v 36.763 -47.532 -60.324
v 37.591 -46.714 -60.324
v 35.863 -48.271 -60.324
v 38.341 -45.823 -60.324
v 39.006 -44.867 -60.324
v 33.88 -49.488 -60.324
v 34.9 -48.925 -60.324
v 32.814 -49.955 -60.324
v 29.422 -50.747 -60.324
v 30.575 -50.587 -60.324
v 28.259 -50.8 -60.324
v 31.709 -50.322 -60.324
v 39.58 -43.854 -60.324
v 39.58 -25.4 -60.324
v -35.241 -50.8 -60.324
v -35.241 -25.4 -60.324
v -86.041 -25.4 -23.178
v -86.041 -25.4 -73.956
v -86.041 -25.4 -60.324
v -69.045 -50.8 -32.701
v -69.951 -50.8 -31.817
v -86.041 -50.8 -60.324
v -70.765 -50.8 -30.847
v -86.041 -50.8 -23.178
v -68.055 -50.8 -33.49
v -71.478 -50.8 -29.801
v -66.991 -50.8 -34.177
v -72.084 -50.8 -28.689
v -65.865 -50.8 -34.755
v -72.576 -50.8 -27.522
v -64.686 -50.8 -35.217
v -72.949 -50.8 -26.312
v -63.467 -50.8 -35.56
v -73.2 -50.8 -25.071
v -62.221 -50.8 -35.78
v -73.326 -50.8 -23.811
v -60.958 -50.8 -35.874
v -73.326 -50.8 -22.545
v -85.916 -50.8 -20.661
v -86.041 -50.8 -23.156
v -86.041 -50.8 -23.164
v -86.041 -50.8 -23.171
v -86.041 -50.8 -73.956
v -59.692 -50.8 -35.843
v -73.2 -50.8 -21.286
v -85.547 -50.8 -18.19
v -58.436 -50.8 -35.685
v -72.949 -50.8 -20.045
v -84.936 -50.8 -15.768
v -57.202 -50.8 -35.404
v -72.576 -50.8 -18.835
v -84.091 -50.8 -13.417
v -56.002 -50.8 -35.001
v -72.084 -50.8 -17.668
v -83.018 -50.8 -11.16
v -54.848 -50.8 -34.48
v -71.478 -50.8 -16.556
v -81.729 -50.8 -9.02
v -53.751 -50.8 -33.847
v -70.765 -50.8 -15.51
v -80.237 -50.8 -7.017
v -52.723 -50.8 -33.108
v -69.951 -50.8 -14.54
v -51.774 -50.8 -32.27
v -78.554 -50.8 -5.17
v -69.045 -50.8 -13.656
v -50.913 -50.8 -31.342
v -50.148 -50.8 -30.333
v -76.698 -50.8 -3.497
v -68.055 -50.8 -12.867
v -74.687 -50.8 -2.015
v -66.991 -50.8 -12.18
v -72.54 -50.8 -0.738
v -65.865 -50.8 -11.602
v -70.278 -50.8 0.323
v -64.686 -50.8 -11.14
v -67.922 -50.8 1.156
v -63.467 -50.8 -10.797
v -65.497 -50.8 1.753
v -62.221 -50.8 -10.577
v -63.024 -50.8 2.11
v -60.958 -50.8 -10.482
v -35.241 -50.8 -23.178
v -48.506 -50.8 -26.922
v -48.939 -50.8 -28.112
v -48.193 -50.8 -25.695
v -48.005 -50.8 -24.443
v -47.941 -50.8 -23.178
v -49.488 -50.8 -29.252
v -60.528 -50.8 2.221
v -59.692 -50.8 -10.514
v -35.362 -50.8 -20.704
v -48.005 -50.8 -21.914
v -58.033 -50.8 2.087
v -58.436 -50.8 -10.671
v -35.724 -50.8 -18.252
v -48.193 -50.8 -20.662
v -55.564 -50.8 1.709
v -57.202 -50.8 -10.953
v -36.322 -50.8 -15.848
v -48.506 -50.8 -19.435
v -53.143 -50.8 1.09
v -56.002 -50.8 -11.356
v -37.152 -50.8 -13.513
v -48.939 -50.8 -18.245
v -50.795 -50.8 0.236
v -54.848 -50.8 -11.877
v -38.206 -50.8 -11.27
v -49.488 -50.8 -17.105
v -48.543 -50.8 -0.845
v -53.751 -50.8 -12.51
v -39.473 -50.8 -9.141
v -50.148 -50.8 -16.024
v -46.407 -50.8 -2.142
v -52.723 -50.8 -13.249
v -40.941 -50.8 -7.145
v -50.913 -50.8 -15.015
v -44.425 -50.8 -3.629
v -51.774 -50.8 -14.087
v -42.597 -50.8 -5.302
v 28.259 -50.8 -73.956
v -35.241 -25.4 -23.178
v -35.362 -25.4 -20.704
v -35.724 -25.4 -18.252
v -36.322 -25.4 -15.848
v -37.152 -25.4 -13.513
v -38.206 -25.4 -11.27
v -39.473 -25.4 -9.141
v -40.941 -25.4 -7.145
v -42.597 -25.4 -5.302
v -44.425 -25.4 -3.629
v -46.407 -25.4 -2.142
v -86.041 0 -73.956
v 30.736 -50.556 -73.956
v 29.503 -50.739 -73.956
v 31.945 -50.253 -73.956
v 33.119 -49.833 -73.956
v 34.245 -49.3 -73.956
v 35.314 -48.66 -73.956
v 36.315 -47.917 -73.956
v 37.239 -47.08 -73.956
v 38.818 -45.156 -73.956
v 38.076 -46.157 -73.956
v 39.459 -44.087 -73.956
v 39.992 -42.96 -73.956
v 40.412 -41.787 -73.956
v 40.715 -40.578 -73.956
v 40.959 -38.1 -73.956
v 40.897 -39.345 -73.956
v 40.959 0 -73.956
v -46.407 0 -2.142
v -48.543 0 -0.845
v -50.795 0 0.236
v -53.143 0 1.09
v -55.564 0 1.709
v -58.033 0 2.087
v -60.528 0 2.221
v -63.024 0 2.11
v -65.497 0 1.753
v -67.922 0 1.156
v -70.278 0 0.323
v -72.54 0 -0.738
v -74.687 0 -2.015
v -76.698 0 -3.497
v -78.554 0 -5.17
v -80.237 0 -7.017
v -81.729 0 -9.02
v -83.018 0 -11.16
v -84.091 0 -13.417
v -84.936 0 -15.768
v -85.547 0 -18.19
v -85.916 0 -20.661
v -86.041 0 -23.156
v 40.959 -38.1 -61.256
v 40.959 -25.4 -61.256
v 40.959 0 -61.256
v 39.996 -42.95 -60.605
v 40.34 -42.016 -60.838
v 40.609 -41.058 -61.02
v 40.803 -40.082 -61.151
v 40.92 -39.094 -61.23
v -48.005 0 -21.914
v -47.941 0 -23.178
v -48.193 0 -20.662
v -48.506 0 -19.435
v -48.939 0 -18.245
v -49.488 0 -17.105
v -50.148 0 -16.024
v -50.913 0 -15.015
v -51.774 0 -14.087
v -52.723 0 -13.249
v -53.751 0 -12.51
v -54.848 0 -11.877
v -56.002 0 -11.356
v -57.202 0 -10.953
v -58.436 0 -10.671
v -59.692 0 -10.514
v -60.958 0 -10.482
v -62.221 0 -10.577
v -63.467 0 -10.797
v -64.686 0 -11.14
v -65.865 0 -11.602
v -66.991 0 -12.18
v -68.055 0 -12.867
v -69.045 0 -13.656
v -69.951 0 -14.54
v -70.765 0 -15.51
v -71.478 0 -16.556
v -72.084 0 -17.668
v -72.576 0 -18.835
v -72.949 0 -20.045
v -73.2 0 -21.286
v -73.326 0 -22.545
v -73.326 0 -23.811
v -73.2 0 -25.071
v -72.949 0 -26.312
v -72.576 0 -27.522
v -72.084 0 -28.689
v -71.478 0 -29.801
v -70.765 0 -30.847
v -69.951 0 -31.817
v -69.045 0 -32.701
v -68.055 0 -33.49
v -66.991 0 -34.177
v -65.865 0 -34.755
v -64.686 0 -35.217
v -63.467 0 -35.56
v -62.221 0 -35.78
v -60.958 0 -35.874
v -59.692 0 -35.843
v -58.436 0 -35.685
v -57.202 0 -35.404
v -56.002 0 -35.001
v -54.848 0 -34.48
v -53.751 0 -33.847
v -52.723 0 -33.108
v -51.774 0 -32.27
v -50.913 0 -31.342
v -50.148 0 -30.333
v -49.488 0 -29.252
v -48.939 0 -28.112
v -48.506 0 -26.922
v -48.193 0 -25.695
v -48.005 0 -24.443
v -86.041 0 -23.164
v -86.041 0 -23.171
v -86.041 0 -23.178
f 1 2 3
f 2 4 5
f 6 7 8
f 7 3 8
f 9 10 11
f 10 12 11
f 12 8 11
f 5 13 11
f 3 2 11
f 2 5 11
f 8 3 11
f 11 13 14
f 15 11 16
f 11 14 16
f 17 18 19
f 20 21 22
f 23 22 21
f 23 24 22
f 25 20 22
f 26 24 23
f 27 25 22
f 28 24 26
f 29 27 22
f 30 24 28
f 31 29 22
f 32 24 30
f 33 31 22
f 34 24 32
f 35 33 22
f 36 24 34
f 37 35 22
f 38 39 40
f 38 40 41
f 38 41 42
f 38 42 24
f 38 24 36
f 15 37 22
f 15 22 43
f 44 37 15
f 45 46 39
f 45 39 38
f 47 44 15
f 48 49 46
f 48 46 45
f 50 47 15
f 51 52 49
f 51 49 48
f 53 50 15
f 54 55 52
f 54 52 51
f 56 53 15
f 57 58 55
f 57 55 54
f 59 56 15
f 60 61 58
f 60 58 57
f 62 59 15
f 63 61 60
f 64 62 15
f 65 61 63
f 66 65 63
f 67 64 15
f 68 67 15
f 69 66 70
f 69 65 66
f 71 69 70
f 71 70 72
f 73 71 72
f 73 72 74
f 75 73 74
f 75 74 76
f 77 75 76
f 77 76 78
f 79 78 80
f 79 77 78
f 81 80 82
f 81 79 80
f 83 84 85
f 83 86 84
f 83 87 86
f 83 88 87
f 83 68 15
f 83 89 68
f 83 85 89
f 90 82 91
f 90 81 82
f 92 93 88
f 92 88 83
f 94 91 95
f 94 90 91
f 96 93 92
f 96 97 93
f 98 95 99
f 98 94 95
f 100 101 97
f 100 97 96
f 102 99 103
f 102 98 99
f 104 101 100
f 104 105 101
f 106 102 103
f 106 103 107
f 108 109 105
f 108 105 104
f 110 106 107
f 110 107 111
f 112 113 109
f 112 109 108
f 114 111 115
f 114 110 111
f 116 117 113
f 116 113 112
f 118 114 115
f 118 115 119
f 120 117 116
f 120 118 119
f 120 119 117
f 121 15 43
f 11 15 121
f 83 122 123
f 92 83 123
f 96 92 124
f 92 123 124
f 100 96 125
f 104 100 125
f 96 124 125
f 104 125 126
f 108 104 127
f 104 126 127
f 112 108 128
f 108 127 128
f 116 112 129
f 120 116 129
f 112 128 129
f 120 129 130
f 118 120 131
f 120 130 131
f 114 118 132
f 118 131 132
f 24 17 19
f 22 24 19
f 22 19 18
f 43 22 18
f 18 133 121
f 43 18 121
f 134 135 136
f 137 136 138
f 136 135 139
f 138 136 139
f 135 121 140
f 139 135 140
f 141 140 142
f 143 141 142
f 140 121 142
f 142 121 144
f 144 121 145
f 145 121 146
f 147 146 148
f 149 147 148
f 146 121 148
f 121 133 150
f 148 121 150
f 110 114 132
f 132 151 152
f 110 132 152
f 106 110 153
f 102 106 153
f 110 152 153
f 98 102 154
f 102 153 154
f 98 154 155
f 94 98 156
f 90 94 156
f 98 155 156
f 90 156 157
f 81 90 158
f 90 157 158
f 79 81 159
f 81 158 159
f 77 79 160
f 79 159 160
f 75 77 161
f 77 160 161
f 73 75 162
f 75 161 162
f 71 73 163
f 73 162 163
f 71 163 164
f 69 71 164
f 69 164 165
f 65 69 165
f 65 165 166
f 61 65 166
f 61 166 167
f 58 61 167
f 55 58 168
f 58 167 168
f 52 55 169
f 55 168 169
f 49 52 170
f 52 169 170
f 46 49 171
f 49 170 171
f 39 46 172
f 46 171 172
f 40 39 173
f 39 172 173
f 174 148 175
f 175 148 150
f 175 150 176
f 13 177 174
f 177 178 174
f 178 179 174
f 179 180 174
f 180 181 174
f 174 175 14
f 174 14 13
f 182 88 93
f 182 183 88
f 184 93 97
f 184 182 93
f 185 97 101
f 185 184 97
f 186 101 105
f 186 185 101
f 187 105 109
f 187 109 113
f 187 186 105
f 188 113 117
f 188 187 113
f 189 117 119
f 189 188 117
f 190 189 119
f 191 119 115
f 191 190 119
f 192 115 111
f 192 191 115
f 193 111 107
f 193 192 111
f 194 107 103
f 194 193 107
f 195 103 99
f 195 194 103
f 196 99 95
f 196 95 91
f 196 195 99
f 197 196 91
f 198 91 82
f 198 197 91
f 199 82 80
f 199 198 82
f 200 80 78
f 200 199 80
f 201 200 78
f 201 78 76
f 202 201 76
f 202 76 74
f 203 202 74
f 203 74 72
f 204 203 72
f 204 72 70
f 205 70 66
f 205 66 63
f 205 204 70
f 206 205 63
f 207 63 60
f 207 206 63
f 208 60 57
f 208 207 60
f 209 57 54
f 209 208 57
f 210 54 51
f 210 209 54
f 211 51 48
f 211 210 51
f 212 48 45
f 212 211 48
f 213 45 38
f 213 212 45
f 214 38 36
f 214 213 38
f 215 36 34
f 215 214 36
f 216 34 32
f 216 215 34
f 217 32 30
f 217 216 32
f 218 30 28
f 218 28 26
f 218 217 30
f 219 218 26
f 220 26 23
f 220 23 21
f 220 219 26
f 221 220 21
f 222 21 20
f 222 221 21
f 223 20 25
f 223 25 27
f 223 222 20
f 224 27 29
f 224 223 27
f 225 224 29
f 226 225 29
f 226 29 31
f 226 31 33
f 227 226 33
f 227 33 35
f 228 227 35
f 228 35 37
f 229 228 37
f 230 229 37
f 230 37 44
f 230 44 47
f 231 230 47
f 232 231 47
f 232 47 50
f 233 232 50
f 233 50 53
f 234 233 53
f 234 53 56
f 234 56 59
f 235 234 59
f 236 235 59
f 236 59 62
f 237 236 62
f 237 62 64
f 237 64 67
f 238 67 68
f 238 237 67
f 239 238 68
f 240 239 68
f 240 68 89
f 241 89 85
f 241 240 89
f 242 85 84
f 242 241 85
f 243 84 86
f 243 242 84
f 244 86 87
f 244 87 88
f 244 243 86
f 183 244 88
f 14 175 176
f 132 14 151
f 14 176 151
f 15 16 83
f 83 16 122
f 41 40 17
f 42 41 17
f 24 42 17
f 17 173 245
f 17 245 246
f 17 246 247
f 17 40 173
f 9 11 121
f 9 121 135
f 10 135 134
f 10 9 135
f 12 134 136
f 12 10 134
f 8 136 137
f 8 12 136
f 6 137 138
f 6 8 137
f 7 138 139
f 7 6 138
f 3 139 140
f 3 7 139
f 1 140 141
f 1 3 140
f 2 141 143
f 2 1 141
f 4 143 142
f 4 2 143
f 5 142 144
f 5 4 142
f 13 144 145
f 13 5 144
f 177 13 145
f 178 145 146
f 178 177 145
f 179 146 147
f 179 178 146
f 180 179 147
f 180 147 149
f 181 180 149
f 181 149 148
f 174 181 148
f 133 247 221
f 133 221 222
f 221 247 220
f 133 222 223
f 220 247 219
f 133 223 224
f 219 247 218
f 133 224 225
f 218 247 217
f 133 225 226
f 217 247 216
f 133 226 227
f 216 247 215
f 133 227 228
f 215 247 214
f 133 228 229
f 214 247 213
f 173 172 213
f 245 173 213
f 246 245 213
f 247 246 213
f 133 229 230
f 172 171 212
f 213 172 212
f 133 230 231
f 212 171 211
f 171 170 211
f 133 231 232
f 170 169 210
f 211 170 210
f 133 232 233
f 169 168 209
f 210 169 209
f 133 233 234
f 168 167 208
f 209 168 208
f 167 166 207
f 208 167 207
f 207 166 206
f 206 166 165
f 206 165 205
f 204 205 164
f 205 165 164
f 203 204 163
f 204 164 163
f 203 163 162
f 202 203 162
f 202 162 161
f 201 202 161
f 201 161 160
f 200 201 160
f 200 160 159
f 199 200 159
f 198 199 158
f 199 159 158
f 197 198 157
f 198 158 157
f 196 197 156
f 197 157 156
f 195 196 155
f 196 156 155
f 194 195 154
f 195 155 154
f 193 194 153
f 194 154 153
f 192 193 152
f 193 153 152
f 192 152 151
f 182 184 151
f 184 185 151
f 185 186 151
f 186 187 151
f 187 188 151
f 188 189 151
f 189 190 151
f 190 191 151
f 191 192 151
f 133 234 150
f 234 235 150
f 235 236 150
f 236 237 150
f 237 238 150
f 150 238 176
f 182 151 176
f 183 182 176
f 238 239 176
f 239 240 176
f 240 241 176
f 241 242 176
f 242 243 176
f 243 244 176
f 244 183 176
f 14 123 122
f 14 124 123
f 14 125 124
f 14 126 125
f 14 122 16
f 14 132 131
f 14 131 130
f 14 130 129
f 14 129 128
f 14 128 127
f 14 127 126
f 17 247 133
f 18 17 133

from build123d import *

# Parameters (mm, degrees)
F0_R     = 12.7
F1_DEPTH = 25.4
F2_R     = 12.7
F3_DEPTH = 25.4
F4_R     = 12.7


# Not quite as in the source:
# - ends of sketch curves that miss each other by under 0.0002 mm in the source are joined


with BuildPart() as f1:
    # F0 (on Front) → F1 (new body)
    with BuildSketch(Plane.XZ):
        with BuildLine():
            Line((40.9585287035, -61.2564672112), (-46.4072367427, -2.1416516533))
            ThreePointArc((-46.4072367427, -2.1416516533), (-72.5399719473, -0.7377161417), (-86.0414712965, -23.1564672112))
            ThreePointArc((-86.0414712965, -23.1564672112), (-86.041478422, -23.1674516111), (-86.0414807971, -23.1784360131))
            Line((-86.0414807971, -23.1784360131), (-86.0414712965, -73.9564672112))
            Line((-86.0414712965, -73.9564672112), (40.9585287035, -73.9564672112))
            Line((40.9585287035, -73.9564672112), (40.9585287035, -61.2564672112))
        make_face()
        with Locations((-60.6414807971, -23.1784360131)):
            Circle(F0_R, mode=Mode.SUBTRACT)
    extrude(amount=F1_DEPTH)

    # F2 (on face) → F3 (join)
    with BuildSketch(Plane.XZ.offset(25.4)):
        with BuildLine():
            Line((-35.2414807971, -60.323882848), (-35.2414807971, -23.1784360131))
            ThreePointArc((-35.2414807971, -23.1784360131), (-38.2059086071, -11.2702413343), (-46.4072367427, -2.1416516533))
            ThreePointArc((-46.4072367427, -2.1416516533), (-72.5399719473, -0.7377161417), (-86.0414712965, -23.1564672112))
            ThreePointArc((-86.0414712965, -23.1564672112), (-86.041478422, -23.1674516111), (-86.0414807971, -23.1784360131))
            Line((-86.0414807971, -23.1784360131), (-86.0414712965, -60.323882848))
            Line((-86.0414712965, -60.323882848), (-86.0414712965, -73.9564672112))
            Line((-86.0414712965, -73.9564672112), (40.9585287035, -73.9564672112))
            Line((40.9585287035, -73.9564672112), (40.9585287035, -61.2564672112))
            Line((40.9585287035, -61.2564672112), (39.5802625959, -60.323882848))
            Line((39.5802625959, -60.323882848), (-35.2414807971, -60.323882848))
        make_face()
        with Locations((-60.6414807971, -23.1784360131)):
            Circle(F2_R, mode=Mode.SUBTRACT)
    extrude(amount=F3_DEPTH)

    # F4
    f4_edges = [f1.edges().sort_by_distance(p)[0] for p in [
        (40.958529, -50.8, -67.606467),
    ]]
    fillet(f4_edges, radius=F4_R)


solid = f1.part
